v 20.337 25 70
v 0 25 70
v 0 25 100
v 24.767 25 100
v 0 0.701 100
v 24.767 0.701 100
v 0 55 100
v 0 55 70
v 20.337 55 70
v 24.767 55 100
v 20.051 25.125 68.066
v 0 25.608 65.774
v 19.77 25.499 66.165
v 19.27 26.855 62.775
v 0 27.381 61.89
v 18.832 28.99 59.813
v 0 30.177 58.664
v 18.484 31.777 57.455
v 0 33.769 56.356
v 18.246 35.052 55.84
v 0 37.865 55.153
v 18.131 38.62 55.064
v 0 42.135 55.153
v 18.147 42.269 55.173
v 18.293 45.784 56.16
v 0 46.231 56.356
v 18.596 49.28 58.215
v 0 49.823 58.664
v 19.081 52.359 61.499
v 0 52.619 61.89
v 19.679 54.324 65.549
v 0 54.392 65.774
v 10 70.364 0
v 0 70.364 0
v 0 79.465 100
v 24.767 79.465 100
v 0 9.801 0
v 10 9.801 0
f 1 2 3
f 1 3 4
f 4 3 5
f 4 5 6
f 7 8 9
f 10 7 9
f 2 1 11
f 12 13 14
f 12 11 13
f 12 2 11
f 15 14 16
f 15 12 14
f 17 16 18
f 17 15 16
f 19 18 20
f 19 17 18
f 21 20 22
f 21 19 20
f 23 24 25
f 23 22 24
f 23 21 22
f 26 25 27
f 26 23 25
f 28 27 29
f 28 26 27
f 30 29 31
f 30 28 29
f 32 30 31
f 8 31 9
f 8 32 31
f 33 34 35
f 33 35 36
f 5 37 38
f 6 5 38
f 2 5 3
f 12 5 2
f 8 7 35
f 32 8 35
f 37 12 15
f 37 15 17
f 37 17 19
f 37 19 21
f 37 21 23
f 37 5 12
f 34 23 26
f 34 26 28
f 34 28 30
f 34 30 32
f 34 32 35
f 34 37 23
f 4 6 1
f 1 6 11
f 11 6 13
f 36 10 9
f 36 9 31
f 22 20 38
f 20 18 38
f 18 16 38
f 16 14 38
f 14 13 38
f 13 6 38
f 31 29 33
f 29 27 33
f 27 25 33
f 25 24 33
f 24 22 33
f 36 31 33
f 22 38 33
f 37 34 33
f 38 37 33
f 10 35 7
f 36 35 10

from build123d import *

# Parameters (mm, degrees)
CYLINDER_R           = 15
CYLINDER_DEPTH       = 100
CYLINDER_PITCH_ANGLE = 90
BOX005_W             = 100
BOX005_H             = 30
BOX005_DEPTH         = 30
BOX004_W             = 40
BOX004_H             = 40
BOX004_DEPTH         = 120
BOX004_ROLL_ANGLE    = -5.2
BOX003_W             = 40
BOX003_H             = 40
BOX003_DEPTH         = 120
BOX003_ROLL_ANGLE    = 5.2
BOX001_W             = 19
BOX001_H             = 100
BOX001_DEPTH         = 110
BOX001_PITCH_ANGLE   = 8.4
BOX_W                = 25
BOX_H                = 80
BOX_DEPTH            = 100


with BuildPart() as cylinder:
    # Cylinder → Cylinder (new body)
    with BuildSketch(Plane.XY):
        Circle(CYLINDER_R)
    extrude(amount=CYLINDER_DEPTH)


with BuildPart() as cylinder_1:
    # Cylinder pitch: moved
    add(cylinder.part.rotate(Axis((0, 0, 0), (0, 1, 0)), CYLINDER_PITCH_ANGLE))


with BuildPart() as cylinder_2:
    # Cylinder placement: moved
    add(cylinder_1.part.moved(Location((0, 40, 70))))


with BuildPart() as fusion:
    # Box005 → Box005 (new body)
    with BuildSketch(Plane(origin=(0, 25, 70), x_dir=(1, 0, 0), z_dir=(0, 0, 1))):
        with Locations((50, 15)):
            Rectangle(BOX005_W, BOX005_H)
    extrude(amount=BOX005_DEPTH)

    # Fusion: union Cylinder
    add(cylinder_2.part)


with BuildPart() as cube002:
    # Box004 → Box004 (new body)
    with BuildSketch(Plane.XY):
        with Locations((20, 20)):
            Rectangle(BOX004_W, BOX004_H)
    extrude(amount=BOX004_DEPTH)


with BuildPart() as cube002_1:
    # Box004 roll: moved
    add(cube002.part.rotate(Axis((0, 0, 0), (1, 0, 0)), BOX004_ROLL_ANGLE))


with BuildPart() as cube002_2:
    # Box004 placement: moved
    add(cube002_1.part.moved(Location((0, 70, -4))))


with BuildPart() as cube003:
    # Box003 → Box003 (new body)
    with BuildSketch(Plane.XY):
        with Locations((20, 20)):
            Rectangle(BOX003_W, BOX003_H)
    extrude(amount=BOX003_DEPTH)


with BuildPart() as cube003_1:
    # Box003 roll: moved
    add(cube003.part.rotate(Axis((0, 0, 0), (1, 0, 0)), BOX003_ROLL_ANGLE))


with BuildPart() as cube003_2:
    # Box003 placement: moved
    add(cube003_1.part.moved(Location((0, -30, -4))))


with BuildPart() as cube001:
    # Box001 → Box001 (new body)
    with BuildSketch(Plane.XY):
        with Locations((9.5, 50)):
            Rectangle(BOX001_W, BOX001_H)
    extrude(amount=BOX001_DEPTH)


with BuildPart() as cube001_1:
    # Box001 pitch: moved
    add(cube001.part.rotate(Axis((0, 0, 0), (0, 1, 0)), BOX001_PITCH_ANGLE))


with BuildPart() as cube001_2:
    # Box001 placement: moved
    add(cube001_1.part.moved(Location((10, 0, 0))))


with BuildPart() as cut003:
    # Box → Box (new body)
    with BuildSketch(Plane.XY):
        with Locations((12.5, 40)):
            Rectangle(BOX_W, BOX_H)
    extrude(amount=BOX_DEPTH)

    # Cut: cut Cube001
    add(cube001_2.part, mode=Mode.SUBTRACT)

    # Cut001: cut Cube003
    add(cube003_2.part, mode=Mode.SUBTRACT)

    # Cut002: cut Cube002
    add(cube002_2.part, mode=Mode.SUBTRACT)

    # Cut003: cut Fusion
    add(fusion.part, mode=Mode.SUBTRACT)


solid = cut003.part
